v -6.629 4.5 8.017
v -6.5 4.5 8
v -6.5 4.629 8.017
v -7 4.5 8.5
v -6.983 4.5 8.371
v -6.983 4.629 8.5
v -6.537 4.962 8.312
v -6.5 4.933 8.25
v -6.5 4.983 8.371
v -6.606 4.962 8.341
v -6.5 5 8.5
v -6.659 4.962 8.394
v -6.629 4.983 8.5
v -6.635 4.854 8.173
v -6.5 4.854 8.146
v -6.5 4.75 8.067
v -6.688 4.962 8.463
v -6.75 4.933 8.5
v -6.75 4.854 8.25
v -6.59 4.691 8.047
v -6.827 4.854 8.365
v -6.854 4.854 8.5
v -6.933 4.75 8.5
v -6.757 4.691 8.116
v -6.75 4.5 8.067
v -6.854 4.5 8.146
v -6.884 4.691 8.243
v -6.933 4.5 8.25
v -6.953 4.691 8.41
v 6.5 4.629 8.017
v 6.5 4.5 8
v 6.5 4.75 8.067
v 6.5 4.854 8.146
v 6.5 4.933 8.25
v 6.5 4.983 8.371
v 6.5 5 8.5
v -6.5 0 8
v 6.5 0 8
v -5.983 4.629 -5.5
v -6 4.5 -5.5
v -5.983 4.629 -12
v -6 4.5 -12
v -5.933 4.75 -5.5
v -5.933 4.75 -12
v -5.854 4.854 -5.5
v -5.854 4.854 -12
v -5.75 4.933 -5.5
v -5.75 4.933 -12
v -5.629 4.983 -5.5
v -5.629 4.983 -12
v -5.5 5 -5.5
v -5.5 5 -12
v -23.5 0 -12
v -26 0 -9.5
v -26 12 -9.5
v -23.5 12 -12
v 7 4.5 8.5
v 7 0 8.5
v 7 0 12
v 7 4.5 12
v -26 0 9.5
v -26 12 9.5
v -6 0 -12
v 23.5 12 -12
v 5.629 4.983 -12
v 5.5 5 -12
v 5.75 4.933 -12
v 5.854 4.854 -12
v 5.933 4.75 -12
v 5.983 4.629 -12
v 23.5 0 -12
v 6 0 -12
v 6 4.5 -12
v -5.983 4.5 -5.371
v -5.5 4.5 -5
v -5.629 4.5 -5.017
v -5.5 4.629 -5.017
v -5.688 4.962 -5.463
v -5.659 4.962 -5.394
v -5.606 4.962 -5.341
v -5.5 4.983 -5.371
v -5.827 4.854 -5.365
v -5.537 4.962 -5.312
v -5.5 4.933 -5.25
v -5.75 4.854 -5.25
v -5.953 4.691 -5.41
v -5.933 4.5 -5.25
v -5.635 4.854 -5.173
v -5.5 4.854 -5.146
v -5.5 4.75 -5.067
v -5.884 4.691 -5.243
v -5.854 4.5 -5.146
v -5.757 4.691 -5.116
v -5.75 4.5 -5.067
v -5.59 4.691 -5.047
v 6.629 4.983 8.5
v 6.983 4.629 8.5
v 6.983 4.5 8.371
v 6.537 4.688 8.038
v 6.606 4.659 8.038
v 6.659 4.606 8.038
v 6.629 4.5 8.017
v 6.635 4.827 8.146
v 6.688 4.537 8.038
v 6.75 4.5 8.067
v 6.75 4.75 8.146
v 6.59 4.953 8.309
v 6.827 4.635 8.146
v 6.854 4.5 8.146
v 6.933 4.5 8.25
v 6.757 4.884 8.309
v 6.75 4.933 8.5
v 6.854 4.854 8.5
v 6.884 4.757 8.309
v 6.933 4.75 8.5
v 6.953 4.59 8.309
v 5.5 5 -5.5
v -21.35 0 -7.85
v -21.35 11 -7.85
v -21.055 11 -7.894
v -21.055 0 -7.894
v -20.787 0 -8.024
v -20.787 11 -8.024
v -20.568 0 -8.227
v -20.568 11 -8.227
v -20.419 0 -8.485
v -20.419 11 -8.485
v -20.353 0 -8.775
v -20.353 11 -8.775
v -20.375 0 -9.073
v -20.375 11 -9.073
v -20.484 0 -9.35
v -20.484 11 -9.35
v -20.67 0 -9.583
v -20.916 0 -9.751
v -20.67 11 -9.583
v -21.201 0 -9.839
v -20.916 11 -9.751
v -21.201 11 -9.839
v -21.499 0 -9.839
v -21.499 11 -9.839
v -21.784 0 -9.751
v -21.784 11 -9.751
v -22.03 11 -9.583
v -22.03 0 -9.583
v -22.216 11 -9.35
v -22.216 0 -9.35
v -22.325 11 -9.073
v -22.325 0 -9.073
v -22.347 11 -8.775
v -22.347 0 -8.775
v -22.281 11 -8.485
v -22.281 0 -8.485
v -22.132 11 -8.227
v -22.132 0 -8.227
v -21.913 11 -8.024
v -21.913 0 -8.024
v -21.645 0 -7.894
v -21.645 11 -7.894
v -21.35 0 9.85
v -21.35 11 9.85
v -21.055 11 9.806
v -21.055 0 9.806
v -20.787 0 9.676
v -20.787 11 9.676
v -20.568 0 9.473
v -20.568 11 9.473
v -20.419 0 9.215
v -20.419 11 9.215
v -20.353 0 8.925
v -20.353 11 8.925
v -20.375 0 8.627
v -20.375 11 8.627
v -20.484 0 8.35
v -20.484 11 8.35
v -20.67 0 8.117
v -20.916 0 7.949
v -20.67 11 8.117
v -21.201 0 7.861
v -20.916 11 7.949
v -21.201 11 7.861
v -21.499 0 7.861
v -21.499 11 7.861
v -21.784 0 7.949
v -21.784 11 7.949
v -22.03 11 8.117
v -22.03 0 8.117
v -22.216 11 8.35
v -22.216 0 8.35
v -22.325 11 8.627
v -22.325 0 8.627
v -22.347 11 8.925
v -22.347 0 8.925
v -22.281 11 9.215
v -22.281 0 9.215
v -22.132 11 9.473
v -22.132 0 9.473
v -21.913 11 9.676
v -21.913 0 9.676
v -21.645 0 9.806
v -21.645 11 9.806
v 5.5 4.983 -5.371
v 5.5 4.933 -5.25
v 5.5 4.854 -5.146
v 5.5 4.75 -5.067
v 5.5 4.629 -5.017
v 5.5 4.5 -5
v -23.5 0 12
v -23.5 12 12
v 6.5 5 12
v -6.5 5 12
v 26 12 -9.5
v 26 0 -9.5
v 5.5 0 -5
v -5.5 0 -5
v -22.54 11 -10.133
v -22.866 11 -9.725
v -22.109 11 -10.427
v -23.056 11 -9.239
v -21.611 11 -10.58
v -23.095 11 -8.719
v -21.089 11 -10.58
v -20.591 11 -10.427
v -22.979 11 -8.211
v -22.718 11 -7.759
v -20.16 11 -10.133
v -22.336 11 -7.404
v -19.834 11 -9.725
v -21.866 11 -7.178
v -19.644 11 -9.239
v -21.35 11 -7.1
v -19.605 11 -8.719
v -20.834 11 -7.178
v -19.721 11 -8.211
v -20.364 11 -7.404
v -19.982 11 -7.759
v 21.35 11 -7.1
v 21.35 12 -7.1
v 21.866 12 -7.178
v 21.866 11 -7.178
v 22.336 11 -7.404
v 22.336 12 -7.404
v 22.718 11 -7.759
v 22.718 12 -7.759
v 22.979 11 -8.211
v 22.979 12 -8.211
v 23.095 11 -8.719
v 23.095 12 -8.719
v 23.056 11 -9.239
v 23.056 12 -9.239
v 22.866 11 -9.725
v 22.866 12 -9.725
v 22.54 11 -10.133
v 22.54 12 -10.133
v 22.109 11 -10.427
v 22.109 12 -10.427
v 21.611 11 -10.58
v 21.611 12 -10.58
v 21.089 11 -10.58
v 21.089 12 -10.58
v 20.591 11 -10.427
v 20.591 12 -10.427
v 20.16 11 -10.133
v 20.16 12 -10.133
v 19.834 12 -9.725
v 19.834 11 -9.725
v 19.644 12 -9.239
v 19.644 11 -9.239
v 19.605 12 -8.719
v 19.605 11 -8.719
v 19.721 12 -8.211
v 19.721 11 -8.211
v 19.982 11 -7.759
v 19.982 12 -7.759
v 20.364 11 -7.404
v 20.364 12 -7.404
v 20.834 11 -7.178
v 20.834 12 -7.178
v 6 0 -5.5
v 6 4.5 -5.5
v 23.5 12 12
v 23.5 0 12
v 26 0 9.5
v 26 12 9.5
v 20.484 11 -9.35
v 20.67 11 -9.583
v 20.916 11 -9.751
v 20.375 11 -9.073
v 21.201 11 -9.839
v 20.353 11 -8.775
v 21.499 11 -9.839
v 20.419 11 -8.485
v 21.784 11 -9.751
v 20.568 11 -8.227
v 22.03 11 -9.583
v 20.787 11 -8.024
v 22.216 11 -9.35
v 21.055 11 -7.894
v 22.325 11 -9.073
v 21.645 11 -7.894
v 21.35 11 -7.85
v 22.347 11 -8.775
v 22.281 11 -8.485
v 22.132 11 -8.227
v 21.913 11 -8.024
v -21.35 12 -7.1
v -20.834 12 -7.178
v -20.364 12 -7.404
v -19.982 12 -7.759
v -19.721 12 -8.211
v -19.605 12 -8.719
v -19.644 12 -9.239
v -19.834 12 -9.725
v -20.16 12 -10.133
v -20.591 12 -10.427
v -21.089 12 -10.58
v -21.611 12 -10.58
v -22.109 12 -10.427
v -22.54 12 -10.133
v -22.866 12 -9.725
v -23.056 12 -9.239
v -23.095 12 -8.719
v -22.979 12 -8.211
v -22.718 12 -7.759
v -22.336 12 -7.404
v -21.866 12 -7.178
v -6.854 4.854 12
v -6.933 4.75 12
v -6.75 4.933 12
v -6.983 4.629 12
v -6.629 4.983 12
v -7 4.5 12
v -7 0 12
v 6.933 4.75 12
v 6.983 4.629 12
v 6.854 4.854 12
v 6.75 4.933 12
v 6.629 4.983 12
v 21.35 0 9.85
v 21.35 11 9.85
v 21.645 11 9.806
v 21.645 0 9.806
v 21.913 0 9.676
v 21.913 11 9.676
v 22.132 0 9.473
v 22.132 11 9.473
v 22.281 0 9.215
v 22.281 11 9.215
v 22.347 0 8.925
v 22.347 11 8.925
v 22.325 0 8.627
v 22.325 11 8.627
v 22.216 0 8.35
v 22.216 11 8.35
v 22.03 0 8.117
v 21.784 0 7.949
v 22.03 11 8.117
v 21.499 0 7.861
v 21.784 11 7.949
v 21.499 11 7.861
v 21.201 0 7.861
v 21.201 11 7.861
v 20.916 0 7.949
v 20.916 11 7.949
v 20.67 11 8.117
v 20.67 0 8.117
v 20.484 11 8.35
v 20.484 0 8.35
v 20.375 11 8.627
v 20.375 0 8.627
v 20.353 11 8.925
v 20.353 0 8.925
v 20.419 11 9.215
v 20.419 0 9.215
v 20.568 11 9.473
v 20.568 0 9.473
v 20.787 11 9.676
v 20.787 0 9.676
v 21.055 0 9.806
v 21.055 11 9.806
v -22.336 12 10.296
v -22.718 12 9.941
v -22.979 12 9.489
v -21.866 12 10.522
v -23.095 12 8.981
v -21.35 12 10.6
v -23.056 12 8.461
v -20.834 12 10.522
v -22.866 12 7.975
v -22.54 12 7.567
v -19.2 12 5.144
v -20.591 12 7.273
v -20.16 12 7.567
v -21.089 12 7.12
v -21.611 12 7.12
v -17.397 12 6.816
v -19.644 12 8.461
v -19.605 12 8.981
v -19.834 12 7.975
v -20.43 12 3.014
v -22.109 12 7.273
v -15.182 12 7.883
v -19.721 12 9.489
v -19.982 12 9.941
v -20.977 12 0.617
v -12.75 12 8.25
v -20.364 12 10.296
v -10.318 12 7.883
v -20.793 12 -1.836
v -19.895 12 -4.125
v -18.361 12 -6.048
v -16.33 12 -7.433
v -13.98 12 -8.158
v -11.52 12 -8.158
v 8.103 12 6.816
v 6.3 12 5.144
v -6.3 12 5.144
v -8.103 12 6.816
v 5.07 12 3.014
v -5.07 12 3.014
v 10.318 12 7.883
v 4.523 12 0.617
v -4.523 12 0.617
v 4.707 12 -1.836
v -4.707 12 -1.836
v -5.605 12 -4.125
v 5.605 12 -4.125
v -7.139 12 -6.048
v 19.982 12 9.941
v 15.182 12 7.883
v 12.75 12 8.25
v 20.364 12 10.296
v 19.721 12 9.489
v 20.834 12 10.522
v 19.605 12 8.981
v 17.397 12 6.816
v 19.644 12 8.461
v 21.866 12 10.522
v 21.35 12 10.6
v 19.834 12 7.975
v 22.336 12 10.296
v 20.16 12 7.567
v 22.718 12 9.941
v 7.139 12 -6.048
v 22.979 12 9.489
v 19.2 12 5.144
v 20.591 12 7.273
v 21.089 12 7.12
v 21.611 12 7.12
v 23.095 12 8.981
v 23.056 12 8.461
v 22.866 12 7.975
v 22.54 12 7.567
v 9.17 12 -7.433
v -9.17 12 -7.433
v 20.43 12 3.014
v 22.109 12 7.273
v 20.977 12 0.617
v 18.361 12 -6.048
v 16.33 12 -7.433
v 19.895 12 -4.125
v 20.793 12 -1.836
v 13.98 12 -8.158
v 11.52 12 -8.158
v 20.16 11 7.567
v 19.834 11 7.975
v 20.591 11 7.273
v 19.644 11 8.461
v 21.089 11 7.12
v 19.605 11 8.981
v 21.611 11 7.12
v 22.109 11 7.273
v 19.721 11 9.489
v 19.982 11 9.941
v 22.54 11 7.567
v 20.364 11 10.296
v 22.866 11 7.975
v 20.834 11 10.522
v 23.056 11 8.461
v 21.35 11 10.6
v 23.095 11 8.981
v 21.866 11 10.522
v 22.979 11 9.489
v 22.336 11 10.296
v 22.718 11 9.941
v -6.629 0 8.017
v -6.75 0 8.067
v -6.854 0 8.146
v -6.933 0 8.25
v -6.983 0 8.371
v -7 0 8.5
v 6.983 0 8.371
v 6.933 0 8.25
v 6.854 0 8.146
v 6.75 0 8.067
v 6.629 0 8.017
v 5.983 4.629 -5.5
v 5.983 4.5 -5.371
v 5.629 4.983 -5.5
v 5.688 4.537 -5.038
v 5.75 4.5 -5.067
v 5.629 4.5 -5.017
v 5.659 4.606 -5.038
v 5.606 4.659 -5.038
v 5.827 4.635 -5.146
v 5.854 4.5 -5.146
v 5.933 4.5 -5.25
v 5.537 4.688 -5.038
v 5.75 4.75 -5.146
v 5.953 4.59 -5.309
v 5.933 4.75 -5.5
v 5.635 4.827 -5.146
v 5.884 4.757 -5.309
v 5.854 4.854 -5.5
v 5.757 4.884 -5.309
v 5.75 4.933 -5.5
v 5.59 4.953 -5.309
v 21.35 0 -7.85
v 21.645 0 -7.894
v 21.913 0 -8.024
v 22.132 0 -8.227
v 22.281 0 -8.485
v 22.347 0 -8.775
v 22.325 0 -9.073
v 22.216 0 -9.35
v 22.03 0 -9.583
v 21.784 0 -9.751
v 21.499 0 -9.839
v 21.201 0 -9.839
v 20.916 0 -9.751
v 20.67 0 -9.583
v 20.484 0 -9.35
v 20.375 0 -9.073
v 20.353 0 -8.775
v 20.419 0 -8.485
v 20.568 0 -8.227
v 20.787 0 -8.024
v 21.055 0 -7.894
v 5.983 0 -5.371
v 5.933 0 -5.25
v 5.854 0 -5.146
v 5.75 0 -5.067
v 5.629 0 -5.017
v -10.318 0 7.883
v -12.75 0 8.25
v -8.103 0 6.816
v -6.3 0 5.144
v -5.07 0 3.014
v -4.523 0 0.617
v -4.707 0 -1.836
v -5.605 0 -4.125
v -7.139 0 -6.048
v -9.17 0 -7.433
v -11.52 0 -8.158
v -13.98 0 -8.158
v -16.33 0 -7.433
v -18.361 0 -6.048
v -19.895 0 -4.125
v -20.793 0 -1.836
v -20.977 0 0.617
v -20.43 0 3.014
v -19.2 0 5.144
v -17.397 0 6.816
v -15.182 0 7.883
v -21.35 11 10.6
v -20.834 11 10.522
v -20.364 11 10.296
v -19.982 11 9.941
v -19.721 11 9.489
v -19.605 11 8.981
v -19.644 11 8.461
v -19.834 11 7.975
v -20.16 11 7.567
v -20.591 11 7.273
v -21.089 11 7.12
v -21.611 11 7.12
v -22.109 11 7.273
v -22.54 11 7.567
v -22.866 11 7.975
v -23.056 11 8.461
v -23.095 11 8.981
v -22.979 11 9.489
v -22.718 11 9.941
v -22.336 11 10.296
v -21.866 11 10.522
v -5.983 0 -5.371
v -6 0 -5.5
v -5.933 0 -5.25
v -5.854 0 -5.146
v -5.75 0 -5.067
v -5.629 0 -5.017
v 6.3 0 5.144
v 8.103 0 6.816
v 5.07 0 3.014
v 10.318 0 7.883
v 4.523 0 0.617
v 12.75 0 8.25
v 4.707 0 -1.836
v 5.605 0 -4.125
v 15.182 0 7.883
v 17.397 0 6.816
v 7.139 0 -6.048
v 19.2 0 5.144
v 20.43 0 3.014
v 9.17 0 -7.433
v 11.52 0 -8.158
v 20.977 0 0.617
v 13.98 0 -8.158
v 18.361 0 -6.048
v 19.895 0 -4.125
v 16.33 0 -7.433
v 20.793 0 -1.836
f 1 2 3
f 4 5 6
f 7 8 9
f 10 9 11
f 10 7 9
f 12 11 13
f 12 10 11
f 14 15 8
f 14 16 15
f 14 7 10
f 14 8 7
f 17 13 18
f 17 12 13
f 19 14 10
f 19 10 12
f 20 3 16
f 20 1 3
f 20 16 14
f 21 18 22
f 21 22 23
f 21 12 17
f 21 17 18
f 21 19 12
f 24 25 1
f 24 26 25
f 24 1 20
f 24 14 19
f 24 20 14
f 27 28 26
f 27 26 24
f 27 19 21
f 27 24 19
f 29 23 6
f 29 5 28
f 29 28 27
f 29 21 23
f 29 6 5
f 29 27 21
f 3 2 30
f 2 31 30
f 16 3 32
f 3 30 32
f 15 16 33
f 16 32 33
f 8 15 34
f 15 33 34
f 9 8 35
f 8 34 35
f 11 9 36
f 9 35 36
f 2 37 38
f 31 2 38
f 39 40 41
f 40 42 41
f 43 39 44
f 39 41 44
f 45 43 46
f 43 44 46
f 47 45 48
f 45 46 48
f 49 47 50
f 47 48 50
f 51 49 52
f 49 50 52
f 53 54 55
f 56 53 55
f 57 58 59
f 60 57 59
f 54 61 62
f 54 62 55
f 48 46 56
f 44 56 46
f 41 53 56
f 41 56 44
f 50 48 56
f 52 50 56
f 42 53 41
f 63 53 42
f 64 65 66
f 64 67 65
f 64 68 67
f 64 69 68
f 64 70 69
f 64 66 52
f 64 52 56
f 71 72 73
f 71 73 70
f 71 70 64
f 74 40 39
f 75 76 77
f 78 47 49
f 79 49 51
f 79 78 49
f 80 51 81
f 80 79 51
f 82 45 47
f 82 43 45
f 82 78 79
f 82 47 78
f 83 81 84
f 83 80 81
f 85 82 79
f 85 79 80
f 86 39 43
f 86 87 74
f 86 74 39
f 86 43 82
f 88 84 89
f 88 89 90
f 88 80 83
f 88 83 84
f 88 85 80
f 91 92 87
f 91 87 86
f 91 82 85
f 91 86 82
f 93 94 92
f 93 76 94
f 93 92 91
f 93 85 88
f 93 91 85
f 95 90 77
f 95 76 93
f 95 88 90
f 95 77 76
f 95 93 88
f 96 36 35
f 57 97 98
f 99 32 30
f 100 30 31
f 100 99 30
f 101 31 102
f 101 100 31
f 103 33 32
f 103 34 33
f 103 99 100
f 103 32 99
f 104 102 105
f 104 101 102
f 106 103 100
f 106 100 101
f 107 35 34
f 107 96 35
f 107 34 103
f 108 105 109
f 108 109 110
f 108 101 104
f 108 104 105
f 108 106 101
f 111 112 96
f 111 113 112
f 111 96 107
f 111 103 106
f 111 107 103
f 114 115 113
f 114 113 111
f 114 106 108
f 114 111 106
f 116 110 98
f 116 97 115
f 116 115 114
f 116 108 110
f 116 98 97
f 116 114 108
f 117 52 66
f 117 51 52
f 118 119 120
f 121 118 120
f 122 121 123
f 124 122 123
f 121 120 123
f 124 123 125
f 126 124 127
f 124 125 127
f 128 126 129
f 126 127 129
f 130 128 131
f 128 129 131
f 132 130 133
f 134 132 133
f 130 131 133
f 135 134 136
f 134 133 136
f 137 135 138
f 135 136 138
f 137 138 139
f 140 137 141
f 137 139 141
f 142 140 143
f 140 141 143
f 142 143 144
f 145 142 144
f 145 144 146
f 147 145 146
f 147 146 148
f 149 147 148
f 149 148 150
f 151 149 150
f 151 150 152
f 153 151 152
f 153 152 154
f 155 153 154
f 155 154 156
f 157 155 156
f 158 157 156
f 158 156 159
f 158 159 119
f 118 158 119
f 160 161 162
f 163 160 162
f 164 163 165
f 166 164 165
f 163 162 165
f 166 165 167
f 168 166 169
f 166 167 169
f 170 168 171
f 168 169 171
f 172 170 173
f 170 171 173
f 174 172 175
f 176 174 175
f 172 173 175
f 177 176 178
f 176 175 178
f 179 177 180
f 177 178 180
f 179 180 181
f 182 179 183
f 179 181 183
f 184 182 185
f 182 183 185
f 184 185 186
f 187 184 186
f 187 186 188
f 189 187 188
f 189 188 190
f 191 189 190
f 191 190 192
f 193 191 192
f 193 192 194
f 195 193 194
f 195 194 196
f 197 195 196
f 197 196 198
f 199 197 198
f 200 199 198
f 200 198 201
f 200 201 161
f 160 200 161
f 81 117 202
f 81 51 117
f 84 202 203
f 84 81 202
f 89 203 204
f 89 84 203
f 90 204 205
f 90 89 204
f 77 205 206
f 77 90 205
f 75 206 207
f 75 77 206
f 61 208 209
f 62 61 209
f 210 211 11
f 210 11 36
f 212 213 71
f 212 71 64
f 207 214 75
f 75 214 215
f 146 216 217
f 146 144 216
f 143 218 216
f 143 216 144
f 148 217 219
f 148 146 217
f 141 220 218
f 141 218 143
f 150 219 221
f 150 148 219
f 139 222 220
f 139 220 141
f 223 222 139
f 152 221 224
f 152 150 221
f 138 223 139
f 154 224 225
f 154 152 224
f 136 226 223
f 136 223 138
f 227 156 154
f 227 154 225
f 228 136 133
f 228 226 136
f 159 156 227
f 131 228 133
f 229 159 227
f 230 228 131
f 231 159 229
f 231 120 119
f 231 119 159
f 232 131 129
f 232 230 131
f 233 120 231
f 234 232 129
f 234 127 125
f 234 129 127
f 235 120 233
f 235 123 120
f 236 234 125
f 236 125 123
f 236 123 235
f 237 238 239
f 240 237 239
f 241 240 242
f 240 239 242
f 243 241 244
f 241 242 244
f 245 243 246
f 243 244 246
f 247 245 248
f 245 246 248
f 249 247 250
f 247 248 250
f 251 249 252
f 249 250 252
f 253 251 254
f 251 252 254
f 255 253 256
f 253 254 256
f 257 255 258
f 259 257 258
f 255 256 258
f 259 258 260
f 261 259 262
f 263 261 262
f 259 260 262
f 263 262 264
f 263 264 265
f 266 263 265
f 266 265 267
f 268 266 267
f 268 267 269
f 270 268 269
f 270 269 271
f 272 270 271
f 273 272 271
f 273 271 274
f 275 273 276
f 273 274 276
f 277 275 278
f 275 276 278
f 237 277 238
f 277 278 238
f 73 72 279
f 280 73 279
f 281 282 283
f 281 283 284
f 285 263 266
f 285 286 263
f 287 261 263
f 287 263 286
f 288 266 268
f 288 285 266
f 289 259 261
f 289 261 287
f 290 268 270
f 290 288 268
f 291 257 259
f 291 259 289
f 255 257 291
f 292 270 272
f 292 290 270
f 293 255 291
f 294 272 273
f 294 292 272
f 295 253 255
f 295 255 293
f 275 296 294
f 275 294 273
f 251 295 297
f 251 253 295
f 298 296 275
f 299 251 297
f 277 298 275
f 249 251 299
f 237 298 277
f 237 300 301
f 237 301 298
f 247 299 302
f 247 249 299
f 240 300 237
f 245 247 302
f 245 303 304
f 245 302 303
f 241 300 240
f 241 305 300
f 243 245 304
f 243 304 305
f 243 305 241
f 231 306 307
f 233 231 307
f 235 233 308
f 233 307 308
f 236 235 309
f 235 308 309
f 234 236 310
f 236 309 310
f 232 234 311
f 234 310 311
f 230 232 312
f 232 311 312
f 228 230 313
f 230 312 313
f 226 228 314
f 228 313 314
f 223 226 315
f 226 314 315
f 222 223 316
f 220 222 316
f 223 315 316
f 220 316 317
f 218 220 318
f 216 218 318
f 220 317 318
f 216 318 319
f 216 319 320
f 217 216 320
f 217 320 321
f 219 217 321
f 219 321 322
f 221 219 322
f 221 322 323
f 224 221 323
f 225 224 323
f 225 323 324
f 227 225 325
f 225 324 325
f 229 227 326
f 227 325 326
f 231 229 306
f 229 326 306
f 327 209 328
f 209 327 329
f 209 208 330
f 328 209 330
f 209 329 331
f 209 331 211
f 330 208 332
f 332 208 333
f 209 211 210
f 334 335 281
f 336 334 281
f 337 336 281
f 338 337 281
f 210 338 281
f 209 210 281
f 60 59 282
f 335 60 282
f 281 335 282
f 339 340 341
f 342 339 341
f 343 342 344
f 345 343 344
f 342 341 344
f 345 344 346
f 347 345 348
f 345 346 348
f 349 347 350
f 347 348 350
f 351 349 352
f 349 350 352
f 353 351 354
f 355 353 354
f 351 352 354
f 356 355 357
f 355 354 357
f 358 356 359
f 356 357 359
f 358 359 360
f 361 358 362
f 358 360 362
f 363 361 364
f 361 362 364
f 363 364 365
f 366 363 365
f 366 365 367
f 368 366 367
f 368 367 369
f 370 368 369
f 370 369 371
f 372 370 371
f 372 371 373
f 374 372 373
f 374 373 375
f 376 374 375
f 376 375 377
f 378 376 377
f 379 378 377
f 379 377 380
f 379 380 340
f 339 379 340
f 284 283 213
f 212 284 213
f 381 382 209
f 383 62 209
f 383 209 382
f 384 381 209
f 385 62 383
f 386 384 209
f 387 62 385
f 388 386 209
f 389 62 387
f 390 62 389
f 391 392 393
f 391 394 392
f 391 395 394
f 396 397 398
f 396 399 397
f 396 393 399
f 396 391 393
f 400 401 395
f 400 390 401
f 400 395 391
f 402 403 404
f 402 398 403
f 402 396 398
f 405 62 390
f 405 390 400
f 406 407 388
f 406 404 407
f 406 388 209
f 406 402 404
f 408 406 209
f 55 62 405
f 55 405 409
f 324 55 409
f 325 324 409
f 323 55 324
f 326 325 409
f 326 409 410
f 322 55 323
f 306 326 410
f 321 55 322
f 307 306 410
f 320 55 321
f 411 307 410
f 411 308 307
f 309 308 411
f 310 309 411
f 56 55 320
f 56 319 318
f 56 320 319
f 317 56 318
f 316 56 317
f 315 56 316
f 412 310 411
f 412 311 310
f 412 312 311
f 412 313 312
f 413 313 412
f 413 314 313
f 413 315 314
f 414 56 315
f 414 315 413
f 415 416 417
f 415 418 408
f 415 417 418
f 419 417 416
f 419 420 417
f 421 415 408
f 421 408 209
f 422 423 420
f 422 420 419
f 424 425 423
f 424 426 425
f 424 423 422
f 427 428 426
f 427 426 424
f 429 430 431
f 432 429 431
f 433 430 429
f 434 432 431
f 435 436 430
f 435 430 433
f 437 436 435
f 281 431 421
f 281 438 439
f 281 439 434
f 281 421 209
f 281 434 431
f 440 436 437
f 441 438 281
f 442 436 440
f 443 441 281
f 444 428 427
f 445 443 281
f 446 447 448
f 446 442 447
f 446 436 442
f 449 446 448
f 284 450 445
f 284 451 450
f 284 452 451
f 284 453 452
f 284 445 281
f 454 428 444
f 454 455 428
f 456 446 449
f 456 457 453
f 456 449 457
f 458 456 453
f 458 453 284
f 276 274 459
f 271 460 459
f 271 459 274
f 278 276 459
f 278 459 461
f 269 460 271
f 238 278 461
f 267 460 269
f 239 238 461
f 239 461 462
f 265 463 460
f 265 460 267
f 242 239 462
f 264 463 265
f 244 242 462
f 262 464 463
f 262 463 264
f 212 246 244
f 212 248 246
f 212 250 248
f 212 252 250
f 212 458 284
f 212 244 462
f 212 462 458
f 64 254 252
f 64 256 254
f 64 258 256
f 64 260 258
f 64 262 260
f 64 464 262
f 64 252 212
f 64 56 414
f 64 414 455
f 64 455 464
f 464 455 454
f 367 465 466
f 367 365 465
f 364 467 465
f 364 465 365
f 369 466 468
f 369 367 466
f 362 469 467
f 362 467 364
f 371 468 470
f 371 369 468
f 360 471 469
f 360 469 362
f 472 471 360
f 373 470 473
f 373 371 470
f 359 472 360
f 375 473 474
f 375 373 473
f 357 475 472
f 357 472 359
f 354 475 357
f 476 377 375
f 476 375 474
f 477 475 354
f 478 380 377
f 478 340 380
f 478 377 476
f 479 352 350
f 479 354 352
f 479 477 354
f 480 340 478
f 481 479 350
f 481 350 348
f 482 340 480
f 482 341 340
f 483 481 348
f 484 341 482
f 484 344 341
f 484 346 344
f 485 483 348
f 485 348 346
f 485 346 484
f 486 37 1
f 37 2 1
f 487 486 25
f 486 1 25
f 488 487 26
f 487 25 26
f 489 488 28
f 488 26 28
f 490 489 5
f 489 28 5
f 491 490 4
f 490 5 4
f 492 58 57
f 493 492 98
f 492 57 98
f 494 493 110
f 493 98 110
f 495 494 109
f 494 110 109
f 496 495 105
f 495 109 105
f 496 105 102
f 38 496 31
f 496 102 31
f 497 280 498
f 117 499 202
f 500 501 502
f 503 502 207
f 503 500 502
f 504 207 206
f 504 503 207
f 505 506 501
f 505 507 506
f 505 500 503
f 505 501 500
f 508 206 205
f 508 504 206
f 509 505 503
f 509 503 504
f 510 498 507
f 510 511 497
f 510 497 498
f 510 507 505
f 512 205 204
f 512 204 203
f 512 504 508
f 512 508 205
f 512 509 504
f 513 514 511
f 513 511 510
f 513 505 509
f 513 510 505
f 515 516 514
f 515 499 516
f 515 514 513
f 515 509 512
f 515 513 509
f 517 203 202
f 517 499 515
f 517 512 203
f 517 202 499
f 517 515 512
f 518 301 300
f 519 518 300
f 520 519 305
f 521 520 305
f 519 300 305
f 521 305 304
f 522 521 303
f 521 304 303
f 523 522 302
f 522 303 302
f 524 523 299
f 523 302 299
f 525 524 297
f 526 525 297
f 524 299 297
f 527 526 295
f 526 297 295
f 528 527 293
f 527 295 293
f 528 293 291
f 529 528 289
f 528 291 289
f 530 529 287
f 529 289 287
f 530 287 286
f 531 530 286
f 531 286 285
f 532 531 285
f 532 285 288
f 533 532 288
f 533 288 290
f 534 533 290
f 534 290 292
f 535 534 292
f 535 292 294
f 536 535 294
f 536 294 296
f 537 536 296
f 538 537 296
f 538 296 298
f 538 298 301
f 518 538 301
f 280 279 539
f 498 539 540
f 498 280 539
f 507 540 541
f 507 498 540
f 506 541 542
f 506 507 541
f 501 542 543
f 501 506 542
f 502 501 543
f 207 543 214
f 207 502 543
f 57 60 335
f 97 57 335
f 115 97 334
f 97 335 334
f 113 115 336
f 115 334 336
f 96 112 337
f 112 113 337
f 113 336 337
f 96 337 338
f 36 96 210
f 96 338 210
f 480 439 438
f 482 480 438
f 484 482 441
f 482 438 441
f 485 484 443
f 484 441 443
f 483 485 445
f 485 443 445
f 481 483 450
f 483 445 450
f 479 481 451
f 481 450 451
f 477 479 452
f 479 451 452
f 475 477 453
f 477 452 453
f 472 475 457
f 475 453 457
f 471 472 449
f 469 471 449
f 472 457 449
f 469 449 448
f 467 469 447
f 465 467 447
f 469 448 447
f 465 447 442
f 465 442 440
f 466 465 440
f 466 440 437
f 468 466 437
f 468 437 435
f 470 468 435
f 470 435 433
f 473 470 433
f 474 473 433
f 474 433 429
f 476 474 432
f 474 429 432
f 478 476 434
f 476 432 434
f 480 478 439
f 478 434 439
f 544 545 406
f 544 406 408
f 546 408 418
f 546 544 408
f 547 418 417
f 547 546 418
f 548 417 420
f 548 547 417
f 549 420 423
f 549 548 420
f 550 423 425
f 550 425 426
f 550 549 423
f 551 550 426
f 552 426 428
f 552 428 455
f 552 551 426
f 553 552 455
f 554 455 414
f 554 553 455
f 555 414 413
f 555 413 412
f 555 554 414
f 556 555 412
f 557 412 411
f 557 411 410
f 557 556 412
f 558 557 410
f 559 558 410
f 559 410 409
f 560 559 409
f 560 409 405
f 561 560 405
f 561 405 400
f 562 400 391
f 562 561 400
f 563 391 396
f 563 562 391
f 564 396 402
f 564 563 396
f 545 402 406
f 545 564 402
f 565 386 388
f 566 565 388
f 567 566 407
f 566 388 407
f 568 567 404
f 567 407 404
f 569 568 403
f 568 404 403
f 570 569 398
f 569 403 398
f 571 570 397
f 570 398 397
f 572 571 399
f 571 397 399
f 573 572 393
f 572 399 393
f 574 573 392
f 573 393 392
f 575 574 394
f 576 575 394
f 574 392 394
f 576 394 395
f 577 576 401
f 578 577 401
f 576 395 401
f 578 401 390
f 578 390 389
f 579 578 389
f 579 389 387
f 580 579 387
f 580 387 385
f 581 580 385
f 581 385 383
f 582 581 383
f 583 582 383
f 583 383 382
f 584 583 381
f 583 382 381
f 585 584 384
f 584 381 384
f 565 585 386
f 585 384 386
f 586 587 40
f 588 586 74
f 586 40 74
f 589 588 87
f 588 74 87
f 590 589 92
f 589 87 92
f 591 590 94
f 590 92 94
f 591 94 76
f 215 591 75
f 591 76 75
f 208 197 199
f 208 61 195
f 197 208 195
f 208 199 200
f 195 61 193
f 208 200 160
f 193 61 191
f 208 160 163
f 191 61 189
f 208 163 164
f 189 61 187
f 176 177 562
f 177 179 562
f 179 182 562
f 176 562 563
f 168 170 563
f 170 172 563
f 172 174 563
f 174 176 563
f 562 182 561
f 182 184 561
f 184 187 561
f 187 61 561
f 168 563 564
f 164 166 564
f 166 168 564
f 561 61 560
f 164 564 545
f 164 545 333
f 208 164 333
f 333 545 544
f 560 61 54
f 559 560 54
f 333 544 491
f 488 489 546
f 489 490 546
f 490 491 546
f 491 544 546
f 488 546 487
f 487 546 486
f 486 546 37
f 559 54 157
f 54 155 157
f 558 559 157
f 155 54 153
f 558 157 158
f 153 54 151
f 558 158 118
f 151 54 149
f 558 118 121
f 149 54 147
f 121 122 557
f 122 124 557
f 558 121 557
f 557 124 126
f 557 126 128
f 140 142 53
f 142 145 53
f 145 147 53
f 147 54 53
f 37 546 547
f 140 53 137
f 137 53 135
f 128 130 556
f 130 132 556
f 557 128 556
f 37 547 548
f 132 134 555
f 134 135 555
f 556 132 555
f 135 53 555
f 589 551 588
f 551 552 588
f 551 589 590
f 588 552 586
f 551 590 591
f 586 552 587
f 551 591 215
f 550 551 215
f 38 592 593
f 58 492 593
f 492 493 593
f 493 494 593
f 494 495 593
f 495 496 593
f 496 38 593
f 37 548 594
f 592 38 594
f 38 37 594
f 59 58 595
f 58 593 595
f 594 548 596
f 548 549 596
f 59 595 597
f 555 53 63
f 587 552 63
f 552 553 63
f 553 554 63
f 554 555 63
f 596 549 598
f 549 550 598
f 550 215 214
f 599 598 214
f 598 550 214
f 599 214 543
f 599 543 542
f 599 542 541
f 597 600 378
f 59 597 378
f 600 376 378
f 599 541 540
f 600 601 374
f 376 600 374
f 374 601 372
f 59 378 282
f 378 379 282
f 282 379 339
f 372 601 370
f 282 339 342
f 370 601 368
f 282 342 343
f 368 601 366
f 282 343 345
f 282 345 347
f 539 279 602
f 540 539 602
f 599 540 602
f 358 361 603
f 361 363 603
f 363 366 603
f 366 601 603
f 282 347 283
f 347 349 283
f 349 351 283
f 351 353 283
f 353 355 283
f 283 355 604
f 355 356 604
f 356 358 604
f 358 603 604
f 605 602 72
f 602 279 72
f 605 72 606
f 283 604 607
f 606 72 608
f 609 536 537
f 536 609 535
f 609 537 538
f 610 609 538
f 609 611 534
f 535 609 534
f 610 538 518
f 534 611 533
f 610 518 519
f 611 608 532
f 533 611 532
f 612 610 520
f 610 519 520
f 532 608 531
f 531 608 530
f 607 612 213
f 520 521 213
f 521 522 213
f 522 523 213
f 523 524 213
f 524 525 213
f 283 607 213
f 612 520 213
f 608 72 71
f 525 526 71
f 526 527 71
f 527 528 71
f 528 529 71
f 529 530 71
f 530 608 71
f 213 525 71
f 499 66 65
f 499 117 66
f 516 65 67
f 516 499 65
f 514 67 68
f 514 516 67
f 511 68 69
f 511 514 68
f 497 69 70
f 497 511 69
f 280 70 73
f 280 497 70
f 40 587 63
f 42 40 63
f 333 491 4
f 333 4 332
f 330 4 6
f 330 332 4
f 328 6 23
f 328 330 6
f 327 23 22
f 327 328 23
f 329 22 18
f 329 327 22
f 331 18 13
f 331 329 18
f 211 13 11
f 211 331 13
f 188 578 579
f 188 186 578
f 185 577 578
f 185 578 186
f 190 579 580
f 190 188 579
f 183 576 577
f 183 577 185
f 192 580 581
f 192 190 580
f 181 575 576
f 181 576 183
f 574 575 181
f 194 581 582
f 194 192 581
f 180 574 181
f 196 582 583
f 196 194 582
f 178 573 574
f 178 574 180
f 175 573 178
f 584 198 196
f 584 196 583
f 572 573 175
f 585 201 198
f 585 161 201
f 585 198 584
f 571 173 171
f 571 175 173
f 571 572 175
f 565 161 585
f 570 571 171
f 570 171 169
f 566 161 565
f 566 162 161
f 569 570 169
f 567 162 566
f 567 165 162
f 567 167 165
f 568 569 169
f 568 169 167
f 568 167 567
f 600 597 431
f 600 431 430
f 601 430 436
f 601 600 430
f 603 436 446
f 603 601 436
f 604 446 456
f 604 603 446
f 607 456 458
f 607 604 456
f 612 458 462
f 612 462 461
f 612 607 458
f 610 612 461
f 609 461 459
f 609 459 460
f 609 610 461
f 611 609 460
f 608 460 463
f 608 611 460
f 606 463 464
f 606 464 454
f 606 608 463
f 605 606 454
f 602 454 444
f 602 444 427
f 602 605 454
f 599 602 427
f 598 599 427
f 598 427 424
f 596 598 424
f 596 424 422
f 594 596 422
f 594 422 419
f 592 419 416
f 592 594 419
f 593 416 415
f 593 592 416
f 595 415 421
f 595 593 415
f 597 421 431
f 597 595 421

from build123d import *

# Parameters (mm, degrees)
SKETCH1_W           = 52
SKETCH1_H           = 24
SKETCH1_R           = 8.25
BOSS_EXTRUDE1_DEPTH = 12
SKETCH2_R           = 1
CUT_EXTRUDE1_DEPTH  = 32.048349393
SKETCH3_R           = 1.75
CUT_EXTRUDE2_DEPTH  = 1
CUT_EXTRUDE3_DEPTH  = 5
FILLET3_R           = 0.5
CHAMFER1_SIZE       = 2.5
SKETCH5_W           = 14
SKETCH5_H           = 8
CUT_EXTRUDE4_DEPTH  = 5
FILLET4_R           = 0.5


with BuildPart() as part:
    # Sketch1 → Boss-Extrude1 (new body)
    with BuildSketch(Plane(origin=(0, 0, 0), x_dir=(1, 0, 0), z_dir=(0, 1, 0))):
        Rectangle(SKETCH1_W, SKETCH1_H)
        with Locations(Location((12.75, 0, 0), (0, 0, 270))):
            Circle(SKETCH1_R, mode=Mode.SUBTRACT)
        with Locations(Location((-12.75, 0, 0), (0, 0, 270))):
            Circle(SKETCH1_R, mode=Mode.SUBTRACT)
    extrude(amount=BOSS_EXTRUDE1_DEPTH)

    # Sketch2 → Cut-Extrude1 (cut, through all)
    with BuildSketch(Plane(origin=(0, 12, 0), x_dir=(1, 0, 0), z_dir=(0, 1, 0))):
        with Locations(Location((-21.35, 8.85, 0), (0, 0, 270))):
            Circle(SKETCH2_R)
        with Locations(Location((21.35, 8.85, 0), (0, 0, 270))):
            Circle(SKETCH2_R)
        with Locations(Location((21.35, -8.85, 0), (0, 0, 270))):
            Circle(SKETCH2_R)
        with Locations(Location((-21.35, -8.85, 0), (0, 0, 270))):
            Circle(SKETCH2_R)
    extrude(amount=-CUT_EXTRUDE1_DEPTH, mode=Mode.SUBTRACT)

    # Sketch3 → Cut-Extrude2 (cut)
    with BuildSketch(Plane(origin=(0, 12, 0), x_dir=(1, 0, 0), z_dir=(0, 1, 0))):
        with Locations(Location((-21.35, 8.85, 0), (0, 0, 270))):
            Circle(SKETCH3_R)
        with Locations(Location((21.35, 8.85, 0), (0, 0, 270))):
            Circle(SKETCH3_R)
        with Locations(Location((21.35, -8.85, 0), (0, 0, 270))):
            Circle(SKETCH3_R)
        with Locations(Location((-21.35, -8.85, 0), (0, 0, 270))):
            Circle(SKETCH3_R)
    extrude(amount=-CUT_EXTRUDE2_DEPTH, mode=Mode.SUBTRACT)

    # Sketch4 → Cut-Extrude3 (cut)
    with BuildSketch(Plane.XZ):
        Polygon((-6, -5), (-6, -12), (6, -12), (6, -5), (0, -5), align=None)
    extrude(amount=-CUT_EXTRUDE3_DEPTH, mode=Mode.SUBTRACT)

    # Fillet3
    fillet3_edges = [part.edges().sort_by_distance(p)[0] for p in [
        (-6, 2.5, -5),
        (6, 5, -8.5),
        (6, 2.5, -5),
        (-6, 5, -8.5),
        (0, 5, -5),
    ]]
    fillet(fillet3_edges, radius=FILLET3_R)

    # Chamfer1
    chamfer1_edges = [part.edges().sort_by_distance(p)[0] for p in [
        (26, 6, 12),
        (-26, 6, 12),
        (-26, 6, -12),
        (26, 6, -12),
    ]]
    chamfer(chamfer1_edges, length=CHAMFER1_SIZE)

    # Sketch5 → Cut-Extrude4 (cut)
    with BuildSketch(Plane.XZ):
        with Locations((0, 12)):
            Rectangle(SKETCH5_W, SKETCH5_H)
    extrude(amount=-CUT_EXTRUDE4_DEPTH, mode=Mode.SUBTRACT)

    # Fillet4
    fillet4_edges = [part.edges().sort_by_distance(p)[0] for p in [
        (-7, 2.5, 8),
        (7, 5, 10),
        (0, 5, 8),
        (-7, 5, 10),
        (7, 2.5, 8),
    ]]
    fillet(fillet4_edges, radius=FILLET4_R)


solid = part.part
